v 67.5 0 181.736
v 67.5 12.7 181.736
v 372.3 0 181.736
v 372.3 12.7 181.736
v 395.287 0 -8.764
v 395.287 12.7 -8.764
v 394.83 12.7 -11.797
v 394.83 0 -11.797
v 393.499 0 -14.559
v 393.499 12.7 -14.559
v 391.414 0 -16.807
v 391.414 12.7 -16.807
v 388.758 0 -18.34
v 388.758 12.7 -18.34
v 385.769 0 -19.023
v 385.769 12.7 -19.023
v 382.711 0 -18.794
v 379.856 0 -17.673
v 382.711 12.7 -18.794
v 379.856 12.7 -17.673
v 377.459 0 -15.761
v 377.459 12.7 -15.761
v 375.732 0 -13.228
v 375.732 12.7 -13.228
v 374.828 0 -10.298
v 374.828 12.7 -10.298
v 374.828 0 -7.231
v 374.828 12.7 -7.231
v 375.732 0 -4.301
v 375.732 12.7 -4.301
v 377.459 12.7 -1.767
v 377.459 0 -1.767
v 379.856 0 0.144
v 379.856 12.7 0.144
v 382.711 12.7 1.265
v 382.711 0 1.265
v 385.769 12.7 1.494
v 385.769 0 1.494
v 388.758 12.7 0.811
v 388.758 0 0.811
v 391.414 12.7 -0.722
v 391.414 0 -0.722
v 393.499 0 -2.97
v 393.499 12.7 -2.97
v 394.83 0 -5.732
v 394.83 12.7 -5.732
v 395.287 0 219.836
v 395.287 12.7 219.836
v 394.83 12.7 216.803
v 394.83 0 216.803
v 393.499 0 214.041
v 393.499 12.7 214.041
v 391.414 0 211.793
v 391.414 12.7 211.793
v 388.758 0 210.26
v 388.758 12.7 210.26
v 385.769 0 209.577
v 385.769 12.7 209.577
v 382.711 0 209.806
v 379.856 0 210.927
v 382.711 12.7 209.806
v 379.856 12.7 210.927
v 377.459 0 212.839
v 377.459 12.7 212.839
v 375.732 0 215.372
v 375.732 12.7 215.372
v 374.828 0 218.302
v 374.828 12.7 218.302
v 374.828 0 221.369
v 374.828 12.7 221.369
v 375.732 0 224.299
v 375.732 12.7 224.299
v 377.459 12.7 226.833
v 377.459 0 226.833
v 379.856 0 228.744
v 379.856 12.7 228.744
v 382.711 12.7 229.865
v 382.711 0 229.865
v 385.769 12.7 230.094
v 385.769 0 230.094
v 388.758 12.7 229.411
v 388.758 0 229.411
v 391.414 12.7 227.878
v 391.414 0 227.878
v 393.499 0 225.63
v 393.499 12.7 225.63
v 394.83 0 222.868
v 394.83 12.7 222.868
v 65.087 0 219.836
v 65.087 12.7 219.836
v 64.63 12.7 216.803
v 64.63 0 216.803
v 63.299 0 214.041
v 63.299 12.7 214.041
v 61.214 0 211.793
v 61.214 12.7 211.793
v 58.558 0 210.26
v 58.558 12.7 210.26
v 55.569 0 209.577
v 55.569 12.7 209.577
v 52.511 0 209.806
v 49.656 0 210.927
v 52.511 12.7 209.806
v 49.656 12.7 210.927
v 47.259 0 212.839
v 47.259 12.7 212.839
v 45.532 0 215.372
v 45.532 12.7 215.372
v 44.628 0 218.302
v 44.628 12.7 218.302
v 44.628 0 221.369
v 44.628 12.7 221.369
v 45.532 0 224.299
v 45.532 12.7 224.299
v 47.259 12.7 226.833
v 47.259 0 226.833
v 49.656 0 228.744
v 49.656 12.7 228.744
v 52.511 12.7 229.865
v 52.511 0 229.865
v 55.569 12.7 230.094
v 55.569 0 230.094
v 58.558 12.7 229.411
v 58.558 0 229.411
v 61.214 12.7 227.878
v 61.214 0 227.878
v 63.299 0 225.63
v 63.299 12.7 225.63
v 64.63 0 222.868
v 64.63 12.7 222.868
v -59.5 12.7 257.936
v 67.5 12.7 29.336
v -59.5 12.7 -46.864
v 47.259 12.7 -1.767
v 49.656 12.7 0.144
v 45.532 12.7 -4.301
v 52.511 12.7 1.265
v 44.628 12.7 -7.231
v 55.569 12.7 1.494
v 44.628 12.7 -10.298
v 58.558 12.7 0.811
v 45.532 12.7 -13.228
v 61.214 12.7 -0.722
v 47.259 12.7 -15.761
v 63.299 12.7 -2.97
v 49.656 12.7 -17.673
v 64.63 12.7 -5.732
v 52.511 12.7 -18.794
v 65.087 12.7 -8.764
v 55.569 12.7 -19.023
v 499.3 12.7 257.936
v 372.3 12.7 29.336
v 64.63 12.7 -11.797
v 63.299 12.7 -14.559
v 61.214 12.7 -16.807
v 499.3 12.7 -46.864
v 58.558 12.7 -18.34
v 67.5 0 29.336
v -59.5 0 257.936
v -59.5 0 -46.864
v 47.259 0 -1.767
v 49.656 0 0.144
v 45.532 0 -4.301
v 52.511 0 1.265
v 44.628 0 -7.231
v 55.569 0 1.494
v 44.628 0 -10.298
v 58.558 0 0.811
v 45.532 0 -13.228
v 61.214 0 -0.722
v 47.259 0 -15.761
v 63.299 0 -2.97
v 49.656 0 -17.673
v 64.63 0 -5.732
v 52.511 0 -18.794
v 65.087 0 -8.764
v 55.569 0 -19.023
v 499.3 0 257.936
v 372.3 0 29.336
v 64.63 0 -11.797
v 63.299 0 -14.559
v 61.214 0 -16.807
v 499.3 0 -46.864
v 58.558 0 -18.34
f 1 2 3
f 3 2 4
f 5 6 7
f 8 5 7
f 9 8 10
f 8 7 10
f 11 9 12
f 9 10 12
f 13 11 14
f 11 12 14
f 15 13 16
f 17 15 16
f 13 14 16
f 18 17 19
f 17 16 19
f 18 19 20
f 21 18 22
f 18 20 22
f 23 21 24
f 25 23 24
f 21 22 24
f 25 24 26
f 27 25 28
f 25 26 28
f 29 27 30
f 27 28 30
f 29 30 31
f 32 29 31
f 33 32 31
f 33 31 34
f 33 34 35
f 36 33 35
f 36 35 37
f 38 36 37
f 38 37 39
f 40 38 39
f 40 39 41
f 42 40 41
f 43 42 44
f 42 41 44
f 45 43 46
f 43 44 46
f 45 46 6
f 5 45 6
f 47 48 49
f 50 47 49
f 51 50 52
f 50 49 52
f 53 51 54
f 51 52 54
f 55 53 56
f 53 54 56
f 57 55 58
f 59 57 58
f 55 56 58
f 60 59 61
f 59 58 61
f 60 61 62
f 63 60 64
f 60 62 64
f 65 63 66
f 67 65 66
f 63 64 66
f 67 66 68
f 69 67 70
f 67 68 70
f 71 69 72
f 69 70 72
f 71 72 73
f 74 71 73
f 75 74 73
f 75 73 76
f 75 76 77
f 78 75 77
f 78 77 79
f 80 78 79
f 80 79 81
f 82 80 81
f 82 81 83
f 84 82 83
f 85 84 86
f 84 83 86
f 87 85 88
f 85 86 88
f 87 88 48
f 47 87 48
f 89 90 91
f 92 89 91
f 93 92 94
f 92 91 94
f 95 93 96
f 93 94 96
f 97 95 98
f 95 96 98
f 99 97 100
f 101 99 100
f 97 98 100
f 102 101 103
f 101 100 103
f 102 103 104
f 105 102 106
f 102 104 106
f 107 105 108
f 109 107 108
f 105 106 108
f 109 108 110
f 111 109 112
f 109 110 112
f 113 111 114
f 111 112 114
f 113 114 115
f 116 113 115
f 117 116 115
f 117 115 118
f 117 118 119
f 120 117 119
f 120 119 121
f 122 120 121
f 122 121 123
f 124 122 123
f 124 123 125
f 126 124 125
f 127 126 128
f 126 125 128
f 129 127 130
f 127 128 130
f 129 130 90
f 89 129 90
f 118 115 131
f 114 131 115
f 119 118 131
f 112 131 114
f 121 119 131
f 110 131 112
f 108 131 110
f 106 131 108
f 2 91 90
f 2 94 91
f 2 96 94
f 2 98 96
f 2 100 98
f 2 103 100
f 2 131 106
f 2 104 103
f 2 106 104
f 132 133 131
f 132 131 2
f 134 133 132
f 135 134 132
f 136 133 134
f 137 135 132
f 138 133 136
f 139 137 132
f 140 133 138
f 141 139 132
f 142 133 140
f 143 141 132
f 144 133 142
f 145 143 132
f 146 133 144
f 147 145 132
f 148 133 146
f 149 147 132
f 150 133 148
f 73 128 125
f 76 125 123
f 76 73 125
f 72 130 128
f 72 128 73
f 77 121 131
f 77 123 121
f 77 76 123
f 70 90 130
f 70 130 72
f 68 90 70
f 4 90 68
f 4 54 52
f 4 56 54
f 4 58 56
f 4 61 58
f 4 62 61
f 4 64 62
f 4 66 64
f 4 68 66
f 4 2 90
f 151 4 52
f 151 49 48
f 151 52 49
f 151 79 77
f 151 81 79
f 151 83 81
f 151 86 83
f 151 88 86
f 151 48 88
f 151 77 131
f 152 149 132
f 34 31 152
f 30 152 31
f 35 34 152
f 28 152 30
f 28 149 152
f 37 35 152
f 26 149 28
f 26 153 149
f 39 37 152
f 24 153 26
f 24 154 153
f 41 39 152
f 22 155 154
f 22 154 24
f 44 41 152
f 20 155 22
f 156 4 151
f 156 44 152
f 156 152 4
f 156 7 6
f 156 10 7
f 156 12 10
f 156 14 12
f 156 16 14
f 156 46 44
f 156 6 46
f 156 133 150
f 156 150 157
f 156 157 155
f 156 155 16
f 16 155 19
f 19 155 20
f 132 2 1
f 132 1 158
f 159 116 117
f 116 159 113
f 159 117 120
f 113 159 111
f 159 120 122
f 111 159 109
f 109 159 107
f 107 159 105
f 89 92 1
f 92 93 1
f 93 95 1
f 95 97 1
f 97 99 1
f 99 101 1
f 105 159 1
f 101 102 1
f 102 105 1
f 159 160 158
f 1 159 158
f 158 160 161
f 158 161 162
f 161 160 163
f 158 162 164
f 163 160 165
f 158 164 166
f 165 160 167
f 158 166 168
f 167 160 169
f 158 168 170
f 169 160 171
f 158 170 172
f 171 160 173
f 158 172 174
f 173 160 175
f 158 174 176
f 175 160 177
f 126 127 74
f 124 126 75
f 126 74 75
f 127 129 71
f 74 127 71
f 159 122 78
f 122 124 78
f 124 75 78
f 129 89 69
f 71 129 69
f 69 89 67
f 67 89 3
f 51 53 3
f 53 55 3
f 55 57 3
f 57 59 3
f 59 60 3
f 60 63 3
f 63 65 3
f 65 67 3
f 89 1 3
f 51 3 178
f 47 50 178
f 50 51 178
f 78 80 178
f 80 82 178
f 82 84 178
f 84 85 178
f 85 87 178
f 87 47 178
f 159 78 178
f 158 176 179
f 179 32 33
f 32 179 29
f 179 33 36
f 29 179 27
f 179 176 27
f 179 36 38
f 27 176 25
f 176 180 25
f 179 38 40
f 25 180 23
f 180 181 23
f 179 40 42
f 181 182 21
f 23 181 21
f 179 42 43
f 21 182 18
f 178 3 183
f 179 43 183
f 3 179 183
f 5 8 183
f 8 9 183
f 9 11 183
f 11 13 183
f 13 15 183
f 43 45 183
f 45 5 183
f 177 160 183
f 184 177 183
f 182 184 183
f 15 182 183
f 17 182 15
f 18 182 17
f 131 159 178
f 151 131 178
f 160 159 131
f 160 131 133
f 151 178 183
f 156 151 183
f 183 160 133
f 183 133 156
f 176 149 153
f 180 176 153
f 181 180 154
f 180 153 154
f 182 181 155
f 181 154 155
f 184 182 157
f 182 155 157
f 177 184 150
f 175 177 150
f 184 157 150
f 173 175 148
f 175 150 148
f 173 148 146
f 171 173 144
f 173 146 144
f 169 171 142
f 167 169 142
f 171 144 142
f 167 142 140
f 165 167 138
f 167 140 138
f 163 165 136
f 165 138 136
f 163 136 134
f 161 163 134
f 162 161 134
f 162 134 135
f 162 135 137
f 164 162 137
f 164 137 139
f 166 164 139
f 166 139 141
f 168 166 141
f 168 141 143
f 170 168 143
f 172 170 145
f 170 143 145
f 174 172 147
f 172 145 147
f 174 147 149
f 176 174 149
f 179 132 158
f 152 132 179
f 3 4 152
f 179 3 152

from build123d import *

# Parameters (mm, degrees)
SKETCH1_W           = 558.8
SKETCH1_H           = 304.8
BOSS_EXTRUDE1_DEPTH = 12.7
SKETCH2_W           = 304.8
SKETCH2_H           = 152.4
CUT_EXTRUDE1_DEPTH  = 12.7
SKETCH4_R           = 10.287
CUT_EXTRUDE2_DEPTH  = 12.7


with BuildPart() as part:
    # Sketch1 → Boss-Extrude1 (new body)
    with BuildSketch(Plane(origin=(0, 0, 0), x_dir=(1, 0, 0), z_dir=(0, 1, 0))):
        with Locations((219.899775418, -105.5355758)):
            Rectangle(SKETCH1_W, SKETCH1_H)
    extrude(amount=BOSS_EXTRUDE1_DEPTH)

    # Sketch2 → Cut-Extrude1 (cut)
    with BuildSketch(Plane(origin=(0, 12.7, 0), x_dir=(1, 0, 0), z_dir=(0, 1, 0))):
        with Locations((219.899775418, -105.5355758)):
            Rectangle(SKETCH2_W, SKETCH2_H)
    extrude(amount=-CUT_EXTRUDE1_DEPTH, mode=Mode.SUBTRACT)

    # Sketch4 → Cut-Extrude2 (cut)
    with BuildSketch(Plane(origin=(0, 12.7, 0), x_dir=(1, 0, 0), z_dir=(0, 1, 0))):
        with Locations((54.799775418, 8.7644242)):
            Circle(SKETCH4_R)
        with Locations((384.999775418, 8.7644242)):
            Circle(SKETCH4_R)
        with Locations((54.799775418, -219.8355758)):
            Circle(SKETCH4_R)
        with Locations((384.999775418, -219.8355758)):
            Circle(SKETCH4_R)
    extrude(amount=-CUT_EXTRUDE2_DEPTH, mode=Mode.SUBTRACT)


solid = part.part
